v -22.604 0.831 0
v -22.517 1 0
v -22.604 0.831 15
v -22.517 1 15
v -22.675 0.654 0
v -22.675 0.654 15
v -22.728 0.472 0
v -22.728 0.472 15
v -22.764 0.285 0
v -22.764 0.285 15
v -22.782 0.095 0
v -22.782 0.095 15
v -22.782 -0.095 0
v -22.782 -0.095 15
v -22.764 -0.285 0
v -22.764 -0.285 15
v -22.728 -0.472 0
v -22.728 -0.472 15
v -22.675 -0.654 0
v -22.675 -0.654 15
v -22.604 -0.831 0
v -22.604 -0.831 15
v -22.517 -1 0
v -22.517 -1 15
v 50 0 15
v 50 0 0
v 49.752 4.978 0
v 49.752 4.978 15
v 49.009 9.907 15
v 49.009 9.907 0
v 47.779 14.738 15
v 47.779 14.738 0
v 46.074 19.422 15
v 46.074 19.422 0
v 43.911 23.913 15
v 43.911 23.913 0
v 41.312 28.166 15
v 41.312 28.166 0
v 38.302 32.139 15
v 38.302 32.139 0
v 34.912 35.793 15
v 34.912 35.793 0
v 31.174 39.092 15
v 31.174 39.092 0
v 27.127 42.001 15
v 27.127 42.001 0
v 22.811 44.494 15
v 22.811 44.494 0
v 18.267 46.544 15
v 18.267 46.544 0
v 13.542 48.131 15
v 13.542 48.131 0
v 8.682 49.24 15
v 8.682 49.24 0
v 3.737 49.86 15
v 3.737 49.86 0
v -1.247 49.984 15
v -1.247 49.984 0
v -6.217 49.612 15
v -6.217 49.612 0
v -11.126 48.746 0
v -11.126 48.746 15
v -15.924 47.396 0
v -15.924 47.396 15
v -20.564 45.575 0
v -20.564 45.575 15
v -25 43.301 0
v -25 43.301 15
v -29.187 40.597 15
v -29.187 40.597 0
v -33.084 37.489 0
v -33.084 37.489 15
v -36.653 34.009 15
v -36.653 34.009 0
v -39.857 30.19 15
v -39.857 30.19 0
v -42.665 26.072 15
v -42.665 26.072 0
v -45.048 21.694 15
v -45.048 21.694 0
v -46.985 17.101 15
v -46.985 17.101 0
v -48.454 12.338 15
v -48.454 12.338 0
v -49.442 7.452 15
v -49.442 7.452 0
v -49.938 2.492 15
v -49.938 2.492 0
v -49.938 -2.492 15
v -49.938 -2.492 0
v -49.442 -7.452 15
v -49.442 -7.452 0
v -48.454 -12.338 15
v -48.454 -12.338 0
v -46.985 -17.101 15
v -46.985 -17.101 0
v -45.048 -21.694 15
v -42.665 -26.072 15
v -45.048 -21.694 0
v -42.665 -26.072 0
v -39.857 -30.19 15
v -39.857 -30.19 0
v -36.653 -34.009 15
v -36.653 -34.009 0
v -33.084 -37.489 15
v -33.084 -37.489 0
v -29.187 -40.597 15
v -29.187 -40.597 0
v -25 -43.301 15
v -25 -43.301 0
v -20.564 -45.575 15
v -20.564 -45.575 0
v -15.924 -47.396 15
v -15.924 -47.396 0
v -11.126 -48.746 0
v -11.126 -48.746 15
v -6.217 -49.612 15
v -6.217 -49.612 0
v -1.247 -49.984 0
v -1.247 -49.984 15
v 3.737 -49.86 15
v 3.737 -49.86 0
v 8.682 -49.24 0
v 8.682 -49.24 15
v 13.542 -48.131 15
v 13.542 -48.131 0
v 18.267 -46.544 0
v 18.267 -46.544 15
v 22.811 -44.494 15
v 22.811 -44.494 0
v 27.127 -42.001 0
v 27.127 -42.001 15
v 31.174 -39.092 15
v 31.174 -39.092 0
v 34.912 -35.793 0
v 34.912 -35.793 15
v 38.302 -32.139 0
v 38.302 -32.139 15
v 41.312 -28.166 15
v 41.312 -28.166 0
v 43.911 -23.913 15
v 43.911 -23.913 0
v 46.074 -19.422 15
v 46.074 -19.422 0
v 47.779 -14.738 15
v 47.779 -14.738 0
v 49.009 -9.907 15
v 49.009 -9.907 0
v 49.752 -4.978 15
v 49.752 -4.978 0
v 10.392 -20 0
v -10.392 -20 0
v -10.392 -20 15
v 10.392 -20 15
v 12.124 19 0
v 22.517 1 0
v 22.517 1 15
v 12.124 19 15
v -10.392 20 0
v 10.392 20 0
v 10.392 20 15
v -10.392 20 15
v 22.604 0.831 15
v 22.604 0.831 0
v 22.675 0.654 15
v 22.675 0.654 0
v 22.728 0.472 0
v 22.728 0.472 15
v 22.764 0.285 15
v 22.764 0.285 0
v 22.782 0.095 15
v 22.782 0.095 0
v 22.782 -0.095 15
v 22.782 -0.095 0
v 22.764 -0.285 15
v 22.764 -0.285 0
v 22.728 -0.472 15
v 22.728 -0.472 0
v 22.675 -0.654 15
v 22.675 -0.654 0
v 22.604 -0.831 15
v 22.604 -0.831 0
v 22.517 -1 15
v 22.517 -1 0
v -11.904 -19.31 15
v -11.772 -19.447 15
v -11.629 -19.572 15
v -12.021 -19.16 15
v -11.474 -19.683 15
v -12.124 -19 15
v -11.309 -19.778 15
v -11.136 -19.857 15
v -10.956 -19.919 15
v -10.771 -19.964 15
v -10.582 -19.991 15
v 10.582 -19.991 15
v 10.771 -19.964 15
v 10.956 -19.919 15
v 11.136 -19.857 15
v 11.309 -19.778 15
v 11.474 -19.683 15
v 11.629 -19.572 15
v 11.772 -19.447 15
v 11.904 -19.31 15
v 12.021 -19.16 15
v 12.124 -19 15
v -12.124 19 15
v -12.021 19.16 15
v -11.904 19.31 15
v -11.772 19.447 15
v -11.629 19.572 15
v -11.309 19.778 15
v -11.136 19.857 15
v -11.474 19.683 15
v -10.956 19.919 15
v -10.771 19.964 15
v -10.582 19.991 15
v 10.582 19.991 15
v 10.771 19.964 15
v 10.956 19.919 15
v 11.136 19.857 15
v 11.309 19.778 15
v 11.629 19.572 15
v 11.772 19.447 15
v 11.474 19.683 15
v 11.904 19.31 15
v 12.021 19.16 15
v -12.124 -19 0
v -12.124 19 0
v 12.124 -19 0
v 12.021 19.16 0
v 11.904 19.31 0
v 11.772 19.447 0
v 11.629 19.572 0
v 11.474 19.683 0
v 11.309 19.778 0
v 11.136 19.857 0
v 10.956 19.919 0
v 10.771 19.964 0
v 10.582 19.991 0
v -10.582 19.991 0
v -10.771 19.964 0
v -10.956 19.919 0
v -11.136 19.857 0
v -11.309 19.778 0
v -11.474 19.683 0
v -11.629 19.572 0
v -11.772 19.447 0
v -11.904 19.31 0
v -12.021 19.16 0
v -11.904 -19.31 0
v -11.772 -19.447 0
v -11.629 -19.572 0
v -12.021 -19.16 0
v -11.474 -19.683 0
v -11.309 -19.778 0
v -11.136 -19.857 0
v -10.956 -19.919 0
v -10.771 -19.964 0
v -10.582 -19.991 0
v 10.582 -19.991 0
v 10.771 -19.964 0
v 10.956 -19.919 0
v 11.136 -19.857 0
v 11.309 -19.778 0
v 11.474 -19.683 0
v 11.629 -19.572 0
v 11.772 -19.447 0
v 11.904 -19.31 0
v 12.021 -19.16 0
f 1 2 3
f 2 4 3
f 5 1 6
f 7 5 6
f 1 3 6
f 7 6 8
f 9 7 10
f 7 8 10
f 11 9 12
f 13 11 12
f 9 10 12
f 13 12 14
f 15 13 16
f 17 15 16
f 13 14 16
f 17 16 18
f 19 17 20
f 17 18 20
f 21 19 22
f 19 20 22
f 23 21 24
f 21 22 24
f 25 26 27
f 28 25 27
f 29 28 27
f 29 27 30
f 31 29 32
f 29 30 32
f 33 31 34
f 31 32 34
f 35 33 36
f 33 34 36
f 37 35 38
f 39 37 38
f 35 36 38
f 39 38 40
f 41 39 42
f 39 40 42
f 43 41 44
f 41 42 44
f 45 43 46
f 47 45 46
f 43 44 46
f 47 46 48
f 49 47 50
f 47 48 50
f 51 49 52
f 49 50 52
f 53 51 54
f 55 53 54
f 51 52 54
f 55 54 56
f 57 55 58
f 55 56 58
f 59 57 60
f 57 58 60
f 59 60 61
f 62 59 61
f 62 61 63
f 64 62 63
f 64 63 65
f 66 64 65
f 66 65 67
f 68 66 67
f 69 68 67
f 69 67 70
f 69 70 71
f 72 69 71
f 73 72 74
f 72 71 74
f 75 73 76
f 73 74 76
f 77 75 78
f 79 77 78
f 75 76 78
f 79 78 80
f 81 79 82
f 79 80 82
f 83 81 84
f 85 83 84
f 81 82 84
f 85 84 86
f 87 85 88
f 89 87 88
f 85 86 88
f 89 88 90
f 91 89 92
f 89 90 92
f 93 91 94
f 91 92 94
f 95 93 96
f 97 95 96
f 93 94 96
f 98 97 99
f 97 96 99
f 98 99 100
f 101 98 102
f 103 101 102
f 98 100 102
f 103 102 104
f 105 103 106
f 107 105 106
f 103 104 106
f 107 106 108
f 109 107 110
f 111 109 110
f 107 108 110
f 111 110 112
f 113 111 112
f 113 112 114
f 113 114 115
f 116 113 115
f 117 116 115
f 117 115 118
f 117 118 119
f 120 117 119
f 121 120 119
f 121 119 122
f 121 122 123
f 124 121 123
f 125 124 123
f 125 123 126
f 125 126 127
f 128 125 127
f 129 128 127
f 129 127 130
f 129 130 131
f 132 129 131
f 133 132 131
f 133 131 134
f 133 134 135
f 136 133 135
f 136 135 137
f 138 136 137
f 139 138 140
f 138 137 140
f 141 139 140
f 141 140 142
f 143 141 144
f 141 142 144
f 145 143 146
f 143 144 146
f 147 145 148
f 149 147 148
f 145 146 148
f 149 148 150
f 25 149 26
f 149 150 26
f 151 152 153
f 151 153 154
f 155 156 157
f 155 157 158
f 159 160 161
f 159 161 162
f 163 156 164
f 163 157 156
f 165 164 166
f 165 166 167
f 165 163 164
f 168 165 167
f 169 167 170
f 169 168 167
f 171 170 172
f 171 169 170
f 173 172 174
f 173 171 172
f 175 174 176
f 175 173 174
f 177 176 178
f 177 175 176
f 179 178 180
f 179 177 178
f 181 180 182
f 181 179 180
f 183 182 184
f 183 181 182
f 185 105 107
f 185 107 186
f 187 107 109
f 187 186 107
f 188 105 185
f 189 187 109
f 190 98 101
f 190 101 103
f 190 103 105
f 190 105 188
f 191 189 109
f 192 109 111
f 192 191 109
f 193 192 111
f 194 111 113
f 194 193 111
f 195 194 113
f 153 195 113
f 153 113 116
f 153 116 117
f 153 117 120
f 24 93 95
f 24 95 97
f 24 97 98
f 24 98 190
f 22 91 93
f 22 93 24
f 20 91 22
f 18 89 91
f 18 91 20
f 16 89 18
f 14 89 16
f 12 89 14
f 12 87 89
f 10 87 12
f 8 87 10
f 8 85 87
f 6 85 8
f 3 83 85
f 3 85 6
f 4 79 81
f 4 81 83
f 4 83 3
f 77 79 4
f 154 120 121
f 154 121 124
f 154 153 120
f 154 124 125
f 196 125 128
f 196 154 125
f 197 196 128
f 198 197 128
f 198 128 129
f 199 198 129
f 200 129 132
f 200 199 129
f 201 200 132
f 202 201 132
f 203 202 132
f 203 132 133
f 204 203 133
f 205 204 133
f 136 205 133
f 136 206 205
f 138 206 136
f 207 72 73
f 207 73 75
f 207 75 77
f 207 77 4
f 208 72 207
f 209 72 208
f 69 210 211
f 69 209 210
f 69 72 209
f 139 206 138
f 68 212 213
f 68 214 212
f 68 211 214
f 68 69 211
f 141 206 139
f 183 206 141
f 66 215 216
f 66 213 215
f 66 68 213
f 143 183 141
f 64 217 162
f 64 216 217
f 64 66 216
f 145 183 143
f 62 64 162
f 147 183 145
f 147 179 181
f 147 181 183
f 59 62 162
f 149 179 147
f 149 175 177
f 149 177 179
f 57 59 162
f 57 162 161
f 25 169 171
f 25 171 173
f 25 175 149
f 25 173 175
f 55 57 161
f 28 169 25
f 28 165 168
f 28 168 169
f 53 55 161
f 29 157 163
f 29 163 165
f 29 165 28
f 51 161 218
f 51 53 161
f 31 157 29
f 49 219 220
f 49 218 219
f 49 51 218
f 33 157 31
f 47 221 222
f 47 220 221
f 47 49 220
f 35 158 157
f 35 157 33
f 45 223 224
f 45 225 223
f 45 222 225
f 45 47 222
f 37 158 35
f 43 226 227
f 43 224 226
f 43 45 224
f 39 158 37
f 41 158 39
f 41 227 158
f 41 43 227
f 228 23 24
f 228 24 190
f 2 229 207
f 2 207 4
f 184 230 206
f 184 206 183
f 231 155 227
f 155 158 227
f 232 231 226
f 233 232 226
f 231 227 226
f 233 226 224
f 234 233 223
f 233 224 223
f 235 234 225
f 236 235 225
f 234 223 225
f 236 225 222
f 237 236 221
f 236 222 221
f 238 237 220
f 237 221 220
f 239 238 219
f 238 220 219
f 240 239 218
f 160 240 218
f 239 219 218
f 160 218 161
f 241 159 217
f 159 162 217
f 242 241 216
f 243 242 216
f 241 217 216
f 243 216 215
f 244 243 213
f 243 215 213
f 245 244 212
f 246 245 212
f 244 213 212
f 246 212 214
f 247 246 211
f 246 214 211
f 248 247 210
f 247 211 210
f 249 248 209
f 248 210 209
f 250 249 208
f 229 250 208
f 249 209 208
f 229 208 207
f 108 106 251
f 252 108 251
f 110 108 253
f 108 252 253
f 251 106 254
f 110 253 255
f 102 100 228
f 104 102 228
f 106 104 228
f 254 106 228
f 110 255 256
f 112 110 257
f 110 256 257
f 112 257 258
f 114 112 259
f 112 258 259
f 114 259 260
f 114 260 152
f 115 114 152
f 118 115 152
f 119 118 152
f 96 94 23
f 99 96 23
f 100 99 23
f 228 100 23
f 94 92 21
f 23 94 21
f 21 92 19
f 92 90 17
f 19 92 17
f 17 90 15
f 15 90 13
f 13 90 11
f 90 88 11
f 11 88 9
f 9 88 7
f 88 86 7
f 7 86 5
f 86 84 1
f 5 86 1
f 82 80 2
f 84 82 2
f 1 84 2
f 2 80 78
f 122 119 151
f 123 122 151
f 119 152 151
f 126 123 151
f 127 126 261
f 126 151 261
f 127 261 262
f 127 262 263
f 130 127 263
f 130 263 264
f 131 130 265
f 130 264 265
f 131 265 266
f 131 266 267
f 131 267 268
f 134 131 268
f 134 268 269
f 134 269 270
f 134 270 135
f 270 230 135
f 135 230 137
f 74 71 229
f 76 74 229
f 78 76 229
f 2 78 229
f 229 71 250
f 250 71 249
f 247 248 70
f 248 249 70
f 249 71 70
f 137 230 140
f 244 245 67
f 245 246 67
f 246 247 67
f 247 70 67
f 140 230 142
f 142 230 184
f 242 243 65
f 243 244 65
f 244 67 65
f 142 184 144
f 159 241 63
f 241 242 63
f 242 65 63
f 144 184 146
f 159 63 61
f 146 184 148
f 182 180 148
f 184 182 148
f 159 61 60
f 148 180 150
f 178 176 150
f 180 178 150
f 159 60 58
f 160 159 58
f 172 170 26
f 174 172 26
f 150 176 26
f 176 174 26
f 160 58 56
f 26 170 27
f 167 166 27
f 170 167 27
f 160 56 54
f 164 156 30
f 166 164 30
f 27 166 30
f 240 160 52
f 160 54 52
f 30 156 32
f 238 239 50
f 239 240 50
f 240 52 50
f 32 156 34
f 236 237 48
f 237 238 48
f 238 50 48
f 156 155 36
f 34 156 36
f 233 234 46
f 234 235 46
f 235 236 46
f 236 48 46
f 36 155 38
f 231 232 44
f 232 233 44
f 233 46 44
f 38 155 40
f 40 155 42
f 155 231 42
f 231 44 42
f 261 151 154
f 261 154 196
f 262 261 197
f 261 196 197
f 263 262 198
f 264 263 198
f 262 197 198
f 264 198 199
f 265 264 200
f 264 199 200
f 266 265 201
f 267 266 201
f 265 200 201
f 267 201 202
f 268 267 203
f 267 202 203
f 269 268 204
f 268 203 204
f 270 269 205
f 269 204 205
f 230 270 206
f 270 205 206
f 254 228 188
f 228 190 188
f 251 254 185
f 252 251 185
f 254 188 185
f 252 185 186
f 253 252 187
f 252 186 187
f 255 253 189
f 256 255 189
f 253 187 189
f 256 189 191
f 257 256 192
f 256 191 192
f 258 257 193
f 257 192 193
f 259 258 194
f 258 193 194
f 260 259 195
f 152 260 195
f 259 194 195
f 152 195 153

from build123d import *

# Parameters (mm, degrees)
SKETCH1_R           = 50
BOSS_EXTRUDE2_DEPTH = 15
FILLET1_R           = 2


with BuildPart() as part:
    # Sketch1 → Boss-Extrude2 (new body)
    with BuildSketch(Plane.XY):
        Circle(SKETCH1_R)
        Polygon((23.094010768, 0), (11.547005384, 20), (-11.547005384, 20), (-23.094010768, 0), (-11.547005384, -20), (11.547005384, -20), align=None, mode=Mode.SUBTRACT)
    extrude(amount=BOSS_EXTRUDE2_DEPTH)

    # Fillet1
    fillet1_edges = [part.edges().sort_by_distance(p)[0] for p in [
        (23.094010768, 0, 7.5),
        (11.547005384, 20, 7.5),
        (-11.547005384, 20, 7.5),
        (-23.094010768, 0, 7.5),
        (-11.547005384, -20, 7.5),
        (11.547005384, -20, 7.5),
    ]]
    fillet(fillet1_edges, radius=FILLET1_R)


solid = part.part
